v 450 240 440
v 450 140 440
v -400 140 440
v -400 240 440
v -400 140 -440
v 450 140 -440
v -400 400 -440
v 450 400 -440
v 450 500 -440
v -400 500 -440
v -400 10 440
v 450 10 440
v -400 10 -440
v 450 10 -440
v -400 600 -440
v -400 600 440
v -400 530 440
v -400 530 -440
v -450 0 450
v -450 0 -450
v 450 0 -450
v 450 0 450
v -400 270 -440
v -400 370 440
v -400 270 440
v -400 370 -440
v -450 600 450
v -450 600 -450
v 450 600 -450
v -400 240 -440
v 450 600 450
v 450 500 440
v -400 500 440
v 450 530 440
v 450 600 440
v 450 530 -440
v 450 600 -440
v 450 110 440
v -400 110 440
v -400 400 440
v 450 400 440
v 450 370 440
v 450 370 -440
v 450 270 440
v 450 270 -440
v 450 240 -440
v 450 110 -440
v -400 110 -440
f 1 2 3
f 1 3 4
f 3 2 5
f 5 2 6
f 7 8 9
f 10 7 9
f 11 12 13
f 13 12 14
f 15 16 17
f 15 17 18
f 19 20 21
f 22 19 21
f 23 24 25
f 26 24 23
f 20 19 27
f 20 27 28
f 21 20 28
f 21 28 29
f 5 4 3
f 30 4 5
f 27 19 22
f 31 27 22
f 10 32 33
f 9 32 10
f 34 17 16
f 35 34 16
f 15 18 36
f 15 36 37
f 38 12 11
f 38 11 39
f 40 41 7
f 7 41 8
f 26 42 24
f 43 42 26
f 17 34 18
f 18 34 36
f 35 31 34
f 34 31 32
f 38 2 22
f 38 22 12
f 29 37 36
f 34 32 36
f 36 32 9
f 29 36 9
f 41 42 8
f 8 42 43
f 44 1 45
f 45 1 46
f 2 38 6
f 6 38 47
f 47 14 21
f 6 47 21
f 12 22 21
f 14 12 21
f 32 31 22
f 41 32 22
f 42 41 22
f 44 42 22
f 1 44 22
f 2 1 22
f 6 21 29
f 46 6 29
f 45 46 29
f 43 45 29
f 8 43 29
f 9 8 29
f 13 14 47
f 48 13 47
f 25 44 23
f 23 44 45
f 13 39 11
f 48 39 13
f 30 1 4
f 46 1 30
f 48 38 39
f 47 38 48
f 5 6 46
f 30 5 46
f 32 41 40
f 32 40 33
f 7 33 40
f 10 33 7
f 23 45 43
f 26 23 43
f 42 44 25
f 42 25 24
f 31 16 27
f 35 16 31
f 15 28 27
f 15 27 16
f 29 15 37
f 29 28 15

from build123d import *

# Parameters (mm, degrees)
SKETCH1_W           = 900
SKETCH1_H           = 900
BOSS_EXTRUDE1_DEPTH = 600
SKETCH3_W           = 880
SKETCH3_H           = 100
CUT_EXTRUDE2_DEPTH  = 850


with BuildPart() as part:
    # Sketch1 → Boss-Extrude1 (new body)
    with BuildSketch(Plane(origin=(0, 0, 0), x_dir=(1, 0, 0), z_dir=(0, 1, 0))):
        Rectangle(SKETCH1_W, SKETCH1_H)
    extrude(amount=BOSS_EXTRUDE1_DEPTH)

    # Sketch3 → Cut-Extrude2 (cut)
    with BuildSketch(Plane(origin=(450, 0, 0), x_dir=(0, 0, -1), z_dir=(1, 0, 0))):
        with Locations((0, 60)):
            Rectangle(SKETCH3_W, SKETCH3_H)
        with Locations((0, 190)):
            Rectangle(SKETCH3_W, SKETCH3_H)
        with Locations((0, 320)):
            Rectangle(SKETCH3_W, SKETCH3_H)
        with Locations((0, 450)):
            Rectangle(SKETCH3_W, SKETCH3_H)
        with Locations((0, 580)):
            Rectangle(SKETCH3_W, SKETCH3_H)
    extrude(amount=-CUT_EXTRUDE2_DEPTH, mode=Mode.SUBTRACT)


solid = part.part
